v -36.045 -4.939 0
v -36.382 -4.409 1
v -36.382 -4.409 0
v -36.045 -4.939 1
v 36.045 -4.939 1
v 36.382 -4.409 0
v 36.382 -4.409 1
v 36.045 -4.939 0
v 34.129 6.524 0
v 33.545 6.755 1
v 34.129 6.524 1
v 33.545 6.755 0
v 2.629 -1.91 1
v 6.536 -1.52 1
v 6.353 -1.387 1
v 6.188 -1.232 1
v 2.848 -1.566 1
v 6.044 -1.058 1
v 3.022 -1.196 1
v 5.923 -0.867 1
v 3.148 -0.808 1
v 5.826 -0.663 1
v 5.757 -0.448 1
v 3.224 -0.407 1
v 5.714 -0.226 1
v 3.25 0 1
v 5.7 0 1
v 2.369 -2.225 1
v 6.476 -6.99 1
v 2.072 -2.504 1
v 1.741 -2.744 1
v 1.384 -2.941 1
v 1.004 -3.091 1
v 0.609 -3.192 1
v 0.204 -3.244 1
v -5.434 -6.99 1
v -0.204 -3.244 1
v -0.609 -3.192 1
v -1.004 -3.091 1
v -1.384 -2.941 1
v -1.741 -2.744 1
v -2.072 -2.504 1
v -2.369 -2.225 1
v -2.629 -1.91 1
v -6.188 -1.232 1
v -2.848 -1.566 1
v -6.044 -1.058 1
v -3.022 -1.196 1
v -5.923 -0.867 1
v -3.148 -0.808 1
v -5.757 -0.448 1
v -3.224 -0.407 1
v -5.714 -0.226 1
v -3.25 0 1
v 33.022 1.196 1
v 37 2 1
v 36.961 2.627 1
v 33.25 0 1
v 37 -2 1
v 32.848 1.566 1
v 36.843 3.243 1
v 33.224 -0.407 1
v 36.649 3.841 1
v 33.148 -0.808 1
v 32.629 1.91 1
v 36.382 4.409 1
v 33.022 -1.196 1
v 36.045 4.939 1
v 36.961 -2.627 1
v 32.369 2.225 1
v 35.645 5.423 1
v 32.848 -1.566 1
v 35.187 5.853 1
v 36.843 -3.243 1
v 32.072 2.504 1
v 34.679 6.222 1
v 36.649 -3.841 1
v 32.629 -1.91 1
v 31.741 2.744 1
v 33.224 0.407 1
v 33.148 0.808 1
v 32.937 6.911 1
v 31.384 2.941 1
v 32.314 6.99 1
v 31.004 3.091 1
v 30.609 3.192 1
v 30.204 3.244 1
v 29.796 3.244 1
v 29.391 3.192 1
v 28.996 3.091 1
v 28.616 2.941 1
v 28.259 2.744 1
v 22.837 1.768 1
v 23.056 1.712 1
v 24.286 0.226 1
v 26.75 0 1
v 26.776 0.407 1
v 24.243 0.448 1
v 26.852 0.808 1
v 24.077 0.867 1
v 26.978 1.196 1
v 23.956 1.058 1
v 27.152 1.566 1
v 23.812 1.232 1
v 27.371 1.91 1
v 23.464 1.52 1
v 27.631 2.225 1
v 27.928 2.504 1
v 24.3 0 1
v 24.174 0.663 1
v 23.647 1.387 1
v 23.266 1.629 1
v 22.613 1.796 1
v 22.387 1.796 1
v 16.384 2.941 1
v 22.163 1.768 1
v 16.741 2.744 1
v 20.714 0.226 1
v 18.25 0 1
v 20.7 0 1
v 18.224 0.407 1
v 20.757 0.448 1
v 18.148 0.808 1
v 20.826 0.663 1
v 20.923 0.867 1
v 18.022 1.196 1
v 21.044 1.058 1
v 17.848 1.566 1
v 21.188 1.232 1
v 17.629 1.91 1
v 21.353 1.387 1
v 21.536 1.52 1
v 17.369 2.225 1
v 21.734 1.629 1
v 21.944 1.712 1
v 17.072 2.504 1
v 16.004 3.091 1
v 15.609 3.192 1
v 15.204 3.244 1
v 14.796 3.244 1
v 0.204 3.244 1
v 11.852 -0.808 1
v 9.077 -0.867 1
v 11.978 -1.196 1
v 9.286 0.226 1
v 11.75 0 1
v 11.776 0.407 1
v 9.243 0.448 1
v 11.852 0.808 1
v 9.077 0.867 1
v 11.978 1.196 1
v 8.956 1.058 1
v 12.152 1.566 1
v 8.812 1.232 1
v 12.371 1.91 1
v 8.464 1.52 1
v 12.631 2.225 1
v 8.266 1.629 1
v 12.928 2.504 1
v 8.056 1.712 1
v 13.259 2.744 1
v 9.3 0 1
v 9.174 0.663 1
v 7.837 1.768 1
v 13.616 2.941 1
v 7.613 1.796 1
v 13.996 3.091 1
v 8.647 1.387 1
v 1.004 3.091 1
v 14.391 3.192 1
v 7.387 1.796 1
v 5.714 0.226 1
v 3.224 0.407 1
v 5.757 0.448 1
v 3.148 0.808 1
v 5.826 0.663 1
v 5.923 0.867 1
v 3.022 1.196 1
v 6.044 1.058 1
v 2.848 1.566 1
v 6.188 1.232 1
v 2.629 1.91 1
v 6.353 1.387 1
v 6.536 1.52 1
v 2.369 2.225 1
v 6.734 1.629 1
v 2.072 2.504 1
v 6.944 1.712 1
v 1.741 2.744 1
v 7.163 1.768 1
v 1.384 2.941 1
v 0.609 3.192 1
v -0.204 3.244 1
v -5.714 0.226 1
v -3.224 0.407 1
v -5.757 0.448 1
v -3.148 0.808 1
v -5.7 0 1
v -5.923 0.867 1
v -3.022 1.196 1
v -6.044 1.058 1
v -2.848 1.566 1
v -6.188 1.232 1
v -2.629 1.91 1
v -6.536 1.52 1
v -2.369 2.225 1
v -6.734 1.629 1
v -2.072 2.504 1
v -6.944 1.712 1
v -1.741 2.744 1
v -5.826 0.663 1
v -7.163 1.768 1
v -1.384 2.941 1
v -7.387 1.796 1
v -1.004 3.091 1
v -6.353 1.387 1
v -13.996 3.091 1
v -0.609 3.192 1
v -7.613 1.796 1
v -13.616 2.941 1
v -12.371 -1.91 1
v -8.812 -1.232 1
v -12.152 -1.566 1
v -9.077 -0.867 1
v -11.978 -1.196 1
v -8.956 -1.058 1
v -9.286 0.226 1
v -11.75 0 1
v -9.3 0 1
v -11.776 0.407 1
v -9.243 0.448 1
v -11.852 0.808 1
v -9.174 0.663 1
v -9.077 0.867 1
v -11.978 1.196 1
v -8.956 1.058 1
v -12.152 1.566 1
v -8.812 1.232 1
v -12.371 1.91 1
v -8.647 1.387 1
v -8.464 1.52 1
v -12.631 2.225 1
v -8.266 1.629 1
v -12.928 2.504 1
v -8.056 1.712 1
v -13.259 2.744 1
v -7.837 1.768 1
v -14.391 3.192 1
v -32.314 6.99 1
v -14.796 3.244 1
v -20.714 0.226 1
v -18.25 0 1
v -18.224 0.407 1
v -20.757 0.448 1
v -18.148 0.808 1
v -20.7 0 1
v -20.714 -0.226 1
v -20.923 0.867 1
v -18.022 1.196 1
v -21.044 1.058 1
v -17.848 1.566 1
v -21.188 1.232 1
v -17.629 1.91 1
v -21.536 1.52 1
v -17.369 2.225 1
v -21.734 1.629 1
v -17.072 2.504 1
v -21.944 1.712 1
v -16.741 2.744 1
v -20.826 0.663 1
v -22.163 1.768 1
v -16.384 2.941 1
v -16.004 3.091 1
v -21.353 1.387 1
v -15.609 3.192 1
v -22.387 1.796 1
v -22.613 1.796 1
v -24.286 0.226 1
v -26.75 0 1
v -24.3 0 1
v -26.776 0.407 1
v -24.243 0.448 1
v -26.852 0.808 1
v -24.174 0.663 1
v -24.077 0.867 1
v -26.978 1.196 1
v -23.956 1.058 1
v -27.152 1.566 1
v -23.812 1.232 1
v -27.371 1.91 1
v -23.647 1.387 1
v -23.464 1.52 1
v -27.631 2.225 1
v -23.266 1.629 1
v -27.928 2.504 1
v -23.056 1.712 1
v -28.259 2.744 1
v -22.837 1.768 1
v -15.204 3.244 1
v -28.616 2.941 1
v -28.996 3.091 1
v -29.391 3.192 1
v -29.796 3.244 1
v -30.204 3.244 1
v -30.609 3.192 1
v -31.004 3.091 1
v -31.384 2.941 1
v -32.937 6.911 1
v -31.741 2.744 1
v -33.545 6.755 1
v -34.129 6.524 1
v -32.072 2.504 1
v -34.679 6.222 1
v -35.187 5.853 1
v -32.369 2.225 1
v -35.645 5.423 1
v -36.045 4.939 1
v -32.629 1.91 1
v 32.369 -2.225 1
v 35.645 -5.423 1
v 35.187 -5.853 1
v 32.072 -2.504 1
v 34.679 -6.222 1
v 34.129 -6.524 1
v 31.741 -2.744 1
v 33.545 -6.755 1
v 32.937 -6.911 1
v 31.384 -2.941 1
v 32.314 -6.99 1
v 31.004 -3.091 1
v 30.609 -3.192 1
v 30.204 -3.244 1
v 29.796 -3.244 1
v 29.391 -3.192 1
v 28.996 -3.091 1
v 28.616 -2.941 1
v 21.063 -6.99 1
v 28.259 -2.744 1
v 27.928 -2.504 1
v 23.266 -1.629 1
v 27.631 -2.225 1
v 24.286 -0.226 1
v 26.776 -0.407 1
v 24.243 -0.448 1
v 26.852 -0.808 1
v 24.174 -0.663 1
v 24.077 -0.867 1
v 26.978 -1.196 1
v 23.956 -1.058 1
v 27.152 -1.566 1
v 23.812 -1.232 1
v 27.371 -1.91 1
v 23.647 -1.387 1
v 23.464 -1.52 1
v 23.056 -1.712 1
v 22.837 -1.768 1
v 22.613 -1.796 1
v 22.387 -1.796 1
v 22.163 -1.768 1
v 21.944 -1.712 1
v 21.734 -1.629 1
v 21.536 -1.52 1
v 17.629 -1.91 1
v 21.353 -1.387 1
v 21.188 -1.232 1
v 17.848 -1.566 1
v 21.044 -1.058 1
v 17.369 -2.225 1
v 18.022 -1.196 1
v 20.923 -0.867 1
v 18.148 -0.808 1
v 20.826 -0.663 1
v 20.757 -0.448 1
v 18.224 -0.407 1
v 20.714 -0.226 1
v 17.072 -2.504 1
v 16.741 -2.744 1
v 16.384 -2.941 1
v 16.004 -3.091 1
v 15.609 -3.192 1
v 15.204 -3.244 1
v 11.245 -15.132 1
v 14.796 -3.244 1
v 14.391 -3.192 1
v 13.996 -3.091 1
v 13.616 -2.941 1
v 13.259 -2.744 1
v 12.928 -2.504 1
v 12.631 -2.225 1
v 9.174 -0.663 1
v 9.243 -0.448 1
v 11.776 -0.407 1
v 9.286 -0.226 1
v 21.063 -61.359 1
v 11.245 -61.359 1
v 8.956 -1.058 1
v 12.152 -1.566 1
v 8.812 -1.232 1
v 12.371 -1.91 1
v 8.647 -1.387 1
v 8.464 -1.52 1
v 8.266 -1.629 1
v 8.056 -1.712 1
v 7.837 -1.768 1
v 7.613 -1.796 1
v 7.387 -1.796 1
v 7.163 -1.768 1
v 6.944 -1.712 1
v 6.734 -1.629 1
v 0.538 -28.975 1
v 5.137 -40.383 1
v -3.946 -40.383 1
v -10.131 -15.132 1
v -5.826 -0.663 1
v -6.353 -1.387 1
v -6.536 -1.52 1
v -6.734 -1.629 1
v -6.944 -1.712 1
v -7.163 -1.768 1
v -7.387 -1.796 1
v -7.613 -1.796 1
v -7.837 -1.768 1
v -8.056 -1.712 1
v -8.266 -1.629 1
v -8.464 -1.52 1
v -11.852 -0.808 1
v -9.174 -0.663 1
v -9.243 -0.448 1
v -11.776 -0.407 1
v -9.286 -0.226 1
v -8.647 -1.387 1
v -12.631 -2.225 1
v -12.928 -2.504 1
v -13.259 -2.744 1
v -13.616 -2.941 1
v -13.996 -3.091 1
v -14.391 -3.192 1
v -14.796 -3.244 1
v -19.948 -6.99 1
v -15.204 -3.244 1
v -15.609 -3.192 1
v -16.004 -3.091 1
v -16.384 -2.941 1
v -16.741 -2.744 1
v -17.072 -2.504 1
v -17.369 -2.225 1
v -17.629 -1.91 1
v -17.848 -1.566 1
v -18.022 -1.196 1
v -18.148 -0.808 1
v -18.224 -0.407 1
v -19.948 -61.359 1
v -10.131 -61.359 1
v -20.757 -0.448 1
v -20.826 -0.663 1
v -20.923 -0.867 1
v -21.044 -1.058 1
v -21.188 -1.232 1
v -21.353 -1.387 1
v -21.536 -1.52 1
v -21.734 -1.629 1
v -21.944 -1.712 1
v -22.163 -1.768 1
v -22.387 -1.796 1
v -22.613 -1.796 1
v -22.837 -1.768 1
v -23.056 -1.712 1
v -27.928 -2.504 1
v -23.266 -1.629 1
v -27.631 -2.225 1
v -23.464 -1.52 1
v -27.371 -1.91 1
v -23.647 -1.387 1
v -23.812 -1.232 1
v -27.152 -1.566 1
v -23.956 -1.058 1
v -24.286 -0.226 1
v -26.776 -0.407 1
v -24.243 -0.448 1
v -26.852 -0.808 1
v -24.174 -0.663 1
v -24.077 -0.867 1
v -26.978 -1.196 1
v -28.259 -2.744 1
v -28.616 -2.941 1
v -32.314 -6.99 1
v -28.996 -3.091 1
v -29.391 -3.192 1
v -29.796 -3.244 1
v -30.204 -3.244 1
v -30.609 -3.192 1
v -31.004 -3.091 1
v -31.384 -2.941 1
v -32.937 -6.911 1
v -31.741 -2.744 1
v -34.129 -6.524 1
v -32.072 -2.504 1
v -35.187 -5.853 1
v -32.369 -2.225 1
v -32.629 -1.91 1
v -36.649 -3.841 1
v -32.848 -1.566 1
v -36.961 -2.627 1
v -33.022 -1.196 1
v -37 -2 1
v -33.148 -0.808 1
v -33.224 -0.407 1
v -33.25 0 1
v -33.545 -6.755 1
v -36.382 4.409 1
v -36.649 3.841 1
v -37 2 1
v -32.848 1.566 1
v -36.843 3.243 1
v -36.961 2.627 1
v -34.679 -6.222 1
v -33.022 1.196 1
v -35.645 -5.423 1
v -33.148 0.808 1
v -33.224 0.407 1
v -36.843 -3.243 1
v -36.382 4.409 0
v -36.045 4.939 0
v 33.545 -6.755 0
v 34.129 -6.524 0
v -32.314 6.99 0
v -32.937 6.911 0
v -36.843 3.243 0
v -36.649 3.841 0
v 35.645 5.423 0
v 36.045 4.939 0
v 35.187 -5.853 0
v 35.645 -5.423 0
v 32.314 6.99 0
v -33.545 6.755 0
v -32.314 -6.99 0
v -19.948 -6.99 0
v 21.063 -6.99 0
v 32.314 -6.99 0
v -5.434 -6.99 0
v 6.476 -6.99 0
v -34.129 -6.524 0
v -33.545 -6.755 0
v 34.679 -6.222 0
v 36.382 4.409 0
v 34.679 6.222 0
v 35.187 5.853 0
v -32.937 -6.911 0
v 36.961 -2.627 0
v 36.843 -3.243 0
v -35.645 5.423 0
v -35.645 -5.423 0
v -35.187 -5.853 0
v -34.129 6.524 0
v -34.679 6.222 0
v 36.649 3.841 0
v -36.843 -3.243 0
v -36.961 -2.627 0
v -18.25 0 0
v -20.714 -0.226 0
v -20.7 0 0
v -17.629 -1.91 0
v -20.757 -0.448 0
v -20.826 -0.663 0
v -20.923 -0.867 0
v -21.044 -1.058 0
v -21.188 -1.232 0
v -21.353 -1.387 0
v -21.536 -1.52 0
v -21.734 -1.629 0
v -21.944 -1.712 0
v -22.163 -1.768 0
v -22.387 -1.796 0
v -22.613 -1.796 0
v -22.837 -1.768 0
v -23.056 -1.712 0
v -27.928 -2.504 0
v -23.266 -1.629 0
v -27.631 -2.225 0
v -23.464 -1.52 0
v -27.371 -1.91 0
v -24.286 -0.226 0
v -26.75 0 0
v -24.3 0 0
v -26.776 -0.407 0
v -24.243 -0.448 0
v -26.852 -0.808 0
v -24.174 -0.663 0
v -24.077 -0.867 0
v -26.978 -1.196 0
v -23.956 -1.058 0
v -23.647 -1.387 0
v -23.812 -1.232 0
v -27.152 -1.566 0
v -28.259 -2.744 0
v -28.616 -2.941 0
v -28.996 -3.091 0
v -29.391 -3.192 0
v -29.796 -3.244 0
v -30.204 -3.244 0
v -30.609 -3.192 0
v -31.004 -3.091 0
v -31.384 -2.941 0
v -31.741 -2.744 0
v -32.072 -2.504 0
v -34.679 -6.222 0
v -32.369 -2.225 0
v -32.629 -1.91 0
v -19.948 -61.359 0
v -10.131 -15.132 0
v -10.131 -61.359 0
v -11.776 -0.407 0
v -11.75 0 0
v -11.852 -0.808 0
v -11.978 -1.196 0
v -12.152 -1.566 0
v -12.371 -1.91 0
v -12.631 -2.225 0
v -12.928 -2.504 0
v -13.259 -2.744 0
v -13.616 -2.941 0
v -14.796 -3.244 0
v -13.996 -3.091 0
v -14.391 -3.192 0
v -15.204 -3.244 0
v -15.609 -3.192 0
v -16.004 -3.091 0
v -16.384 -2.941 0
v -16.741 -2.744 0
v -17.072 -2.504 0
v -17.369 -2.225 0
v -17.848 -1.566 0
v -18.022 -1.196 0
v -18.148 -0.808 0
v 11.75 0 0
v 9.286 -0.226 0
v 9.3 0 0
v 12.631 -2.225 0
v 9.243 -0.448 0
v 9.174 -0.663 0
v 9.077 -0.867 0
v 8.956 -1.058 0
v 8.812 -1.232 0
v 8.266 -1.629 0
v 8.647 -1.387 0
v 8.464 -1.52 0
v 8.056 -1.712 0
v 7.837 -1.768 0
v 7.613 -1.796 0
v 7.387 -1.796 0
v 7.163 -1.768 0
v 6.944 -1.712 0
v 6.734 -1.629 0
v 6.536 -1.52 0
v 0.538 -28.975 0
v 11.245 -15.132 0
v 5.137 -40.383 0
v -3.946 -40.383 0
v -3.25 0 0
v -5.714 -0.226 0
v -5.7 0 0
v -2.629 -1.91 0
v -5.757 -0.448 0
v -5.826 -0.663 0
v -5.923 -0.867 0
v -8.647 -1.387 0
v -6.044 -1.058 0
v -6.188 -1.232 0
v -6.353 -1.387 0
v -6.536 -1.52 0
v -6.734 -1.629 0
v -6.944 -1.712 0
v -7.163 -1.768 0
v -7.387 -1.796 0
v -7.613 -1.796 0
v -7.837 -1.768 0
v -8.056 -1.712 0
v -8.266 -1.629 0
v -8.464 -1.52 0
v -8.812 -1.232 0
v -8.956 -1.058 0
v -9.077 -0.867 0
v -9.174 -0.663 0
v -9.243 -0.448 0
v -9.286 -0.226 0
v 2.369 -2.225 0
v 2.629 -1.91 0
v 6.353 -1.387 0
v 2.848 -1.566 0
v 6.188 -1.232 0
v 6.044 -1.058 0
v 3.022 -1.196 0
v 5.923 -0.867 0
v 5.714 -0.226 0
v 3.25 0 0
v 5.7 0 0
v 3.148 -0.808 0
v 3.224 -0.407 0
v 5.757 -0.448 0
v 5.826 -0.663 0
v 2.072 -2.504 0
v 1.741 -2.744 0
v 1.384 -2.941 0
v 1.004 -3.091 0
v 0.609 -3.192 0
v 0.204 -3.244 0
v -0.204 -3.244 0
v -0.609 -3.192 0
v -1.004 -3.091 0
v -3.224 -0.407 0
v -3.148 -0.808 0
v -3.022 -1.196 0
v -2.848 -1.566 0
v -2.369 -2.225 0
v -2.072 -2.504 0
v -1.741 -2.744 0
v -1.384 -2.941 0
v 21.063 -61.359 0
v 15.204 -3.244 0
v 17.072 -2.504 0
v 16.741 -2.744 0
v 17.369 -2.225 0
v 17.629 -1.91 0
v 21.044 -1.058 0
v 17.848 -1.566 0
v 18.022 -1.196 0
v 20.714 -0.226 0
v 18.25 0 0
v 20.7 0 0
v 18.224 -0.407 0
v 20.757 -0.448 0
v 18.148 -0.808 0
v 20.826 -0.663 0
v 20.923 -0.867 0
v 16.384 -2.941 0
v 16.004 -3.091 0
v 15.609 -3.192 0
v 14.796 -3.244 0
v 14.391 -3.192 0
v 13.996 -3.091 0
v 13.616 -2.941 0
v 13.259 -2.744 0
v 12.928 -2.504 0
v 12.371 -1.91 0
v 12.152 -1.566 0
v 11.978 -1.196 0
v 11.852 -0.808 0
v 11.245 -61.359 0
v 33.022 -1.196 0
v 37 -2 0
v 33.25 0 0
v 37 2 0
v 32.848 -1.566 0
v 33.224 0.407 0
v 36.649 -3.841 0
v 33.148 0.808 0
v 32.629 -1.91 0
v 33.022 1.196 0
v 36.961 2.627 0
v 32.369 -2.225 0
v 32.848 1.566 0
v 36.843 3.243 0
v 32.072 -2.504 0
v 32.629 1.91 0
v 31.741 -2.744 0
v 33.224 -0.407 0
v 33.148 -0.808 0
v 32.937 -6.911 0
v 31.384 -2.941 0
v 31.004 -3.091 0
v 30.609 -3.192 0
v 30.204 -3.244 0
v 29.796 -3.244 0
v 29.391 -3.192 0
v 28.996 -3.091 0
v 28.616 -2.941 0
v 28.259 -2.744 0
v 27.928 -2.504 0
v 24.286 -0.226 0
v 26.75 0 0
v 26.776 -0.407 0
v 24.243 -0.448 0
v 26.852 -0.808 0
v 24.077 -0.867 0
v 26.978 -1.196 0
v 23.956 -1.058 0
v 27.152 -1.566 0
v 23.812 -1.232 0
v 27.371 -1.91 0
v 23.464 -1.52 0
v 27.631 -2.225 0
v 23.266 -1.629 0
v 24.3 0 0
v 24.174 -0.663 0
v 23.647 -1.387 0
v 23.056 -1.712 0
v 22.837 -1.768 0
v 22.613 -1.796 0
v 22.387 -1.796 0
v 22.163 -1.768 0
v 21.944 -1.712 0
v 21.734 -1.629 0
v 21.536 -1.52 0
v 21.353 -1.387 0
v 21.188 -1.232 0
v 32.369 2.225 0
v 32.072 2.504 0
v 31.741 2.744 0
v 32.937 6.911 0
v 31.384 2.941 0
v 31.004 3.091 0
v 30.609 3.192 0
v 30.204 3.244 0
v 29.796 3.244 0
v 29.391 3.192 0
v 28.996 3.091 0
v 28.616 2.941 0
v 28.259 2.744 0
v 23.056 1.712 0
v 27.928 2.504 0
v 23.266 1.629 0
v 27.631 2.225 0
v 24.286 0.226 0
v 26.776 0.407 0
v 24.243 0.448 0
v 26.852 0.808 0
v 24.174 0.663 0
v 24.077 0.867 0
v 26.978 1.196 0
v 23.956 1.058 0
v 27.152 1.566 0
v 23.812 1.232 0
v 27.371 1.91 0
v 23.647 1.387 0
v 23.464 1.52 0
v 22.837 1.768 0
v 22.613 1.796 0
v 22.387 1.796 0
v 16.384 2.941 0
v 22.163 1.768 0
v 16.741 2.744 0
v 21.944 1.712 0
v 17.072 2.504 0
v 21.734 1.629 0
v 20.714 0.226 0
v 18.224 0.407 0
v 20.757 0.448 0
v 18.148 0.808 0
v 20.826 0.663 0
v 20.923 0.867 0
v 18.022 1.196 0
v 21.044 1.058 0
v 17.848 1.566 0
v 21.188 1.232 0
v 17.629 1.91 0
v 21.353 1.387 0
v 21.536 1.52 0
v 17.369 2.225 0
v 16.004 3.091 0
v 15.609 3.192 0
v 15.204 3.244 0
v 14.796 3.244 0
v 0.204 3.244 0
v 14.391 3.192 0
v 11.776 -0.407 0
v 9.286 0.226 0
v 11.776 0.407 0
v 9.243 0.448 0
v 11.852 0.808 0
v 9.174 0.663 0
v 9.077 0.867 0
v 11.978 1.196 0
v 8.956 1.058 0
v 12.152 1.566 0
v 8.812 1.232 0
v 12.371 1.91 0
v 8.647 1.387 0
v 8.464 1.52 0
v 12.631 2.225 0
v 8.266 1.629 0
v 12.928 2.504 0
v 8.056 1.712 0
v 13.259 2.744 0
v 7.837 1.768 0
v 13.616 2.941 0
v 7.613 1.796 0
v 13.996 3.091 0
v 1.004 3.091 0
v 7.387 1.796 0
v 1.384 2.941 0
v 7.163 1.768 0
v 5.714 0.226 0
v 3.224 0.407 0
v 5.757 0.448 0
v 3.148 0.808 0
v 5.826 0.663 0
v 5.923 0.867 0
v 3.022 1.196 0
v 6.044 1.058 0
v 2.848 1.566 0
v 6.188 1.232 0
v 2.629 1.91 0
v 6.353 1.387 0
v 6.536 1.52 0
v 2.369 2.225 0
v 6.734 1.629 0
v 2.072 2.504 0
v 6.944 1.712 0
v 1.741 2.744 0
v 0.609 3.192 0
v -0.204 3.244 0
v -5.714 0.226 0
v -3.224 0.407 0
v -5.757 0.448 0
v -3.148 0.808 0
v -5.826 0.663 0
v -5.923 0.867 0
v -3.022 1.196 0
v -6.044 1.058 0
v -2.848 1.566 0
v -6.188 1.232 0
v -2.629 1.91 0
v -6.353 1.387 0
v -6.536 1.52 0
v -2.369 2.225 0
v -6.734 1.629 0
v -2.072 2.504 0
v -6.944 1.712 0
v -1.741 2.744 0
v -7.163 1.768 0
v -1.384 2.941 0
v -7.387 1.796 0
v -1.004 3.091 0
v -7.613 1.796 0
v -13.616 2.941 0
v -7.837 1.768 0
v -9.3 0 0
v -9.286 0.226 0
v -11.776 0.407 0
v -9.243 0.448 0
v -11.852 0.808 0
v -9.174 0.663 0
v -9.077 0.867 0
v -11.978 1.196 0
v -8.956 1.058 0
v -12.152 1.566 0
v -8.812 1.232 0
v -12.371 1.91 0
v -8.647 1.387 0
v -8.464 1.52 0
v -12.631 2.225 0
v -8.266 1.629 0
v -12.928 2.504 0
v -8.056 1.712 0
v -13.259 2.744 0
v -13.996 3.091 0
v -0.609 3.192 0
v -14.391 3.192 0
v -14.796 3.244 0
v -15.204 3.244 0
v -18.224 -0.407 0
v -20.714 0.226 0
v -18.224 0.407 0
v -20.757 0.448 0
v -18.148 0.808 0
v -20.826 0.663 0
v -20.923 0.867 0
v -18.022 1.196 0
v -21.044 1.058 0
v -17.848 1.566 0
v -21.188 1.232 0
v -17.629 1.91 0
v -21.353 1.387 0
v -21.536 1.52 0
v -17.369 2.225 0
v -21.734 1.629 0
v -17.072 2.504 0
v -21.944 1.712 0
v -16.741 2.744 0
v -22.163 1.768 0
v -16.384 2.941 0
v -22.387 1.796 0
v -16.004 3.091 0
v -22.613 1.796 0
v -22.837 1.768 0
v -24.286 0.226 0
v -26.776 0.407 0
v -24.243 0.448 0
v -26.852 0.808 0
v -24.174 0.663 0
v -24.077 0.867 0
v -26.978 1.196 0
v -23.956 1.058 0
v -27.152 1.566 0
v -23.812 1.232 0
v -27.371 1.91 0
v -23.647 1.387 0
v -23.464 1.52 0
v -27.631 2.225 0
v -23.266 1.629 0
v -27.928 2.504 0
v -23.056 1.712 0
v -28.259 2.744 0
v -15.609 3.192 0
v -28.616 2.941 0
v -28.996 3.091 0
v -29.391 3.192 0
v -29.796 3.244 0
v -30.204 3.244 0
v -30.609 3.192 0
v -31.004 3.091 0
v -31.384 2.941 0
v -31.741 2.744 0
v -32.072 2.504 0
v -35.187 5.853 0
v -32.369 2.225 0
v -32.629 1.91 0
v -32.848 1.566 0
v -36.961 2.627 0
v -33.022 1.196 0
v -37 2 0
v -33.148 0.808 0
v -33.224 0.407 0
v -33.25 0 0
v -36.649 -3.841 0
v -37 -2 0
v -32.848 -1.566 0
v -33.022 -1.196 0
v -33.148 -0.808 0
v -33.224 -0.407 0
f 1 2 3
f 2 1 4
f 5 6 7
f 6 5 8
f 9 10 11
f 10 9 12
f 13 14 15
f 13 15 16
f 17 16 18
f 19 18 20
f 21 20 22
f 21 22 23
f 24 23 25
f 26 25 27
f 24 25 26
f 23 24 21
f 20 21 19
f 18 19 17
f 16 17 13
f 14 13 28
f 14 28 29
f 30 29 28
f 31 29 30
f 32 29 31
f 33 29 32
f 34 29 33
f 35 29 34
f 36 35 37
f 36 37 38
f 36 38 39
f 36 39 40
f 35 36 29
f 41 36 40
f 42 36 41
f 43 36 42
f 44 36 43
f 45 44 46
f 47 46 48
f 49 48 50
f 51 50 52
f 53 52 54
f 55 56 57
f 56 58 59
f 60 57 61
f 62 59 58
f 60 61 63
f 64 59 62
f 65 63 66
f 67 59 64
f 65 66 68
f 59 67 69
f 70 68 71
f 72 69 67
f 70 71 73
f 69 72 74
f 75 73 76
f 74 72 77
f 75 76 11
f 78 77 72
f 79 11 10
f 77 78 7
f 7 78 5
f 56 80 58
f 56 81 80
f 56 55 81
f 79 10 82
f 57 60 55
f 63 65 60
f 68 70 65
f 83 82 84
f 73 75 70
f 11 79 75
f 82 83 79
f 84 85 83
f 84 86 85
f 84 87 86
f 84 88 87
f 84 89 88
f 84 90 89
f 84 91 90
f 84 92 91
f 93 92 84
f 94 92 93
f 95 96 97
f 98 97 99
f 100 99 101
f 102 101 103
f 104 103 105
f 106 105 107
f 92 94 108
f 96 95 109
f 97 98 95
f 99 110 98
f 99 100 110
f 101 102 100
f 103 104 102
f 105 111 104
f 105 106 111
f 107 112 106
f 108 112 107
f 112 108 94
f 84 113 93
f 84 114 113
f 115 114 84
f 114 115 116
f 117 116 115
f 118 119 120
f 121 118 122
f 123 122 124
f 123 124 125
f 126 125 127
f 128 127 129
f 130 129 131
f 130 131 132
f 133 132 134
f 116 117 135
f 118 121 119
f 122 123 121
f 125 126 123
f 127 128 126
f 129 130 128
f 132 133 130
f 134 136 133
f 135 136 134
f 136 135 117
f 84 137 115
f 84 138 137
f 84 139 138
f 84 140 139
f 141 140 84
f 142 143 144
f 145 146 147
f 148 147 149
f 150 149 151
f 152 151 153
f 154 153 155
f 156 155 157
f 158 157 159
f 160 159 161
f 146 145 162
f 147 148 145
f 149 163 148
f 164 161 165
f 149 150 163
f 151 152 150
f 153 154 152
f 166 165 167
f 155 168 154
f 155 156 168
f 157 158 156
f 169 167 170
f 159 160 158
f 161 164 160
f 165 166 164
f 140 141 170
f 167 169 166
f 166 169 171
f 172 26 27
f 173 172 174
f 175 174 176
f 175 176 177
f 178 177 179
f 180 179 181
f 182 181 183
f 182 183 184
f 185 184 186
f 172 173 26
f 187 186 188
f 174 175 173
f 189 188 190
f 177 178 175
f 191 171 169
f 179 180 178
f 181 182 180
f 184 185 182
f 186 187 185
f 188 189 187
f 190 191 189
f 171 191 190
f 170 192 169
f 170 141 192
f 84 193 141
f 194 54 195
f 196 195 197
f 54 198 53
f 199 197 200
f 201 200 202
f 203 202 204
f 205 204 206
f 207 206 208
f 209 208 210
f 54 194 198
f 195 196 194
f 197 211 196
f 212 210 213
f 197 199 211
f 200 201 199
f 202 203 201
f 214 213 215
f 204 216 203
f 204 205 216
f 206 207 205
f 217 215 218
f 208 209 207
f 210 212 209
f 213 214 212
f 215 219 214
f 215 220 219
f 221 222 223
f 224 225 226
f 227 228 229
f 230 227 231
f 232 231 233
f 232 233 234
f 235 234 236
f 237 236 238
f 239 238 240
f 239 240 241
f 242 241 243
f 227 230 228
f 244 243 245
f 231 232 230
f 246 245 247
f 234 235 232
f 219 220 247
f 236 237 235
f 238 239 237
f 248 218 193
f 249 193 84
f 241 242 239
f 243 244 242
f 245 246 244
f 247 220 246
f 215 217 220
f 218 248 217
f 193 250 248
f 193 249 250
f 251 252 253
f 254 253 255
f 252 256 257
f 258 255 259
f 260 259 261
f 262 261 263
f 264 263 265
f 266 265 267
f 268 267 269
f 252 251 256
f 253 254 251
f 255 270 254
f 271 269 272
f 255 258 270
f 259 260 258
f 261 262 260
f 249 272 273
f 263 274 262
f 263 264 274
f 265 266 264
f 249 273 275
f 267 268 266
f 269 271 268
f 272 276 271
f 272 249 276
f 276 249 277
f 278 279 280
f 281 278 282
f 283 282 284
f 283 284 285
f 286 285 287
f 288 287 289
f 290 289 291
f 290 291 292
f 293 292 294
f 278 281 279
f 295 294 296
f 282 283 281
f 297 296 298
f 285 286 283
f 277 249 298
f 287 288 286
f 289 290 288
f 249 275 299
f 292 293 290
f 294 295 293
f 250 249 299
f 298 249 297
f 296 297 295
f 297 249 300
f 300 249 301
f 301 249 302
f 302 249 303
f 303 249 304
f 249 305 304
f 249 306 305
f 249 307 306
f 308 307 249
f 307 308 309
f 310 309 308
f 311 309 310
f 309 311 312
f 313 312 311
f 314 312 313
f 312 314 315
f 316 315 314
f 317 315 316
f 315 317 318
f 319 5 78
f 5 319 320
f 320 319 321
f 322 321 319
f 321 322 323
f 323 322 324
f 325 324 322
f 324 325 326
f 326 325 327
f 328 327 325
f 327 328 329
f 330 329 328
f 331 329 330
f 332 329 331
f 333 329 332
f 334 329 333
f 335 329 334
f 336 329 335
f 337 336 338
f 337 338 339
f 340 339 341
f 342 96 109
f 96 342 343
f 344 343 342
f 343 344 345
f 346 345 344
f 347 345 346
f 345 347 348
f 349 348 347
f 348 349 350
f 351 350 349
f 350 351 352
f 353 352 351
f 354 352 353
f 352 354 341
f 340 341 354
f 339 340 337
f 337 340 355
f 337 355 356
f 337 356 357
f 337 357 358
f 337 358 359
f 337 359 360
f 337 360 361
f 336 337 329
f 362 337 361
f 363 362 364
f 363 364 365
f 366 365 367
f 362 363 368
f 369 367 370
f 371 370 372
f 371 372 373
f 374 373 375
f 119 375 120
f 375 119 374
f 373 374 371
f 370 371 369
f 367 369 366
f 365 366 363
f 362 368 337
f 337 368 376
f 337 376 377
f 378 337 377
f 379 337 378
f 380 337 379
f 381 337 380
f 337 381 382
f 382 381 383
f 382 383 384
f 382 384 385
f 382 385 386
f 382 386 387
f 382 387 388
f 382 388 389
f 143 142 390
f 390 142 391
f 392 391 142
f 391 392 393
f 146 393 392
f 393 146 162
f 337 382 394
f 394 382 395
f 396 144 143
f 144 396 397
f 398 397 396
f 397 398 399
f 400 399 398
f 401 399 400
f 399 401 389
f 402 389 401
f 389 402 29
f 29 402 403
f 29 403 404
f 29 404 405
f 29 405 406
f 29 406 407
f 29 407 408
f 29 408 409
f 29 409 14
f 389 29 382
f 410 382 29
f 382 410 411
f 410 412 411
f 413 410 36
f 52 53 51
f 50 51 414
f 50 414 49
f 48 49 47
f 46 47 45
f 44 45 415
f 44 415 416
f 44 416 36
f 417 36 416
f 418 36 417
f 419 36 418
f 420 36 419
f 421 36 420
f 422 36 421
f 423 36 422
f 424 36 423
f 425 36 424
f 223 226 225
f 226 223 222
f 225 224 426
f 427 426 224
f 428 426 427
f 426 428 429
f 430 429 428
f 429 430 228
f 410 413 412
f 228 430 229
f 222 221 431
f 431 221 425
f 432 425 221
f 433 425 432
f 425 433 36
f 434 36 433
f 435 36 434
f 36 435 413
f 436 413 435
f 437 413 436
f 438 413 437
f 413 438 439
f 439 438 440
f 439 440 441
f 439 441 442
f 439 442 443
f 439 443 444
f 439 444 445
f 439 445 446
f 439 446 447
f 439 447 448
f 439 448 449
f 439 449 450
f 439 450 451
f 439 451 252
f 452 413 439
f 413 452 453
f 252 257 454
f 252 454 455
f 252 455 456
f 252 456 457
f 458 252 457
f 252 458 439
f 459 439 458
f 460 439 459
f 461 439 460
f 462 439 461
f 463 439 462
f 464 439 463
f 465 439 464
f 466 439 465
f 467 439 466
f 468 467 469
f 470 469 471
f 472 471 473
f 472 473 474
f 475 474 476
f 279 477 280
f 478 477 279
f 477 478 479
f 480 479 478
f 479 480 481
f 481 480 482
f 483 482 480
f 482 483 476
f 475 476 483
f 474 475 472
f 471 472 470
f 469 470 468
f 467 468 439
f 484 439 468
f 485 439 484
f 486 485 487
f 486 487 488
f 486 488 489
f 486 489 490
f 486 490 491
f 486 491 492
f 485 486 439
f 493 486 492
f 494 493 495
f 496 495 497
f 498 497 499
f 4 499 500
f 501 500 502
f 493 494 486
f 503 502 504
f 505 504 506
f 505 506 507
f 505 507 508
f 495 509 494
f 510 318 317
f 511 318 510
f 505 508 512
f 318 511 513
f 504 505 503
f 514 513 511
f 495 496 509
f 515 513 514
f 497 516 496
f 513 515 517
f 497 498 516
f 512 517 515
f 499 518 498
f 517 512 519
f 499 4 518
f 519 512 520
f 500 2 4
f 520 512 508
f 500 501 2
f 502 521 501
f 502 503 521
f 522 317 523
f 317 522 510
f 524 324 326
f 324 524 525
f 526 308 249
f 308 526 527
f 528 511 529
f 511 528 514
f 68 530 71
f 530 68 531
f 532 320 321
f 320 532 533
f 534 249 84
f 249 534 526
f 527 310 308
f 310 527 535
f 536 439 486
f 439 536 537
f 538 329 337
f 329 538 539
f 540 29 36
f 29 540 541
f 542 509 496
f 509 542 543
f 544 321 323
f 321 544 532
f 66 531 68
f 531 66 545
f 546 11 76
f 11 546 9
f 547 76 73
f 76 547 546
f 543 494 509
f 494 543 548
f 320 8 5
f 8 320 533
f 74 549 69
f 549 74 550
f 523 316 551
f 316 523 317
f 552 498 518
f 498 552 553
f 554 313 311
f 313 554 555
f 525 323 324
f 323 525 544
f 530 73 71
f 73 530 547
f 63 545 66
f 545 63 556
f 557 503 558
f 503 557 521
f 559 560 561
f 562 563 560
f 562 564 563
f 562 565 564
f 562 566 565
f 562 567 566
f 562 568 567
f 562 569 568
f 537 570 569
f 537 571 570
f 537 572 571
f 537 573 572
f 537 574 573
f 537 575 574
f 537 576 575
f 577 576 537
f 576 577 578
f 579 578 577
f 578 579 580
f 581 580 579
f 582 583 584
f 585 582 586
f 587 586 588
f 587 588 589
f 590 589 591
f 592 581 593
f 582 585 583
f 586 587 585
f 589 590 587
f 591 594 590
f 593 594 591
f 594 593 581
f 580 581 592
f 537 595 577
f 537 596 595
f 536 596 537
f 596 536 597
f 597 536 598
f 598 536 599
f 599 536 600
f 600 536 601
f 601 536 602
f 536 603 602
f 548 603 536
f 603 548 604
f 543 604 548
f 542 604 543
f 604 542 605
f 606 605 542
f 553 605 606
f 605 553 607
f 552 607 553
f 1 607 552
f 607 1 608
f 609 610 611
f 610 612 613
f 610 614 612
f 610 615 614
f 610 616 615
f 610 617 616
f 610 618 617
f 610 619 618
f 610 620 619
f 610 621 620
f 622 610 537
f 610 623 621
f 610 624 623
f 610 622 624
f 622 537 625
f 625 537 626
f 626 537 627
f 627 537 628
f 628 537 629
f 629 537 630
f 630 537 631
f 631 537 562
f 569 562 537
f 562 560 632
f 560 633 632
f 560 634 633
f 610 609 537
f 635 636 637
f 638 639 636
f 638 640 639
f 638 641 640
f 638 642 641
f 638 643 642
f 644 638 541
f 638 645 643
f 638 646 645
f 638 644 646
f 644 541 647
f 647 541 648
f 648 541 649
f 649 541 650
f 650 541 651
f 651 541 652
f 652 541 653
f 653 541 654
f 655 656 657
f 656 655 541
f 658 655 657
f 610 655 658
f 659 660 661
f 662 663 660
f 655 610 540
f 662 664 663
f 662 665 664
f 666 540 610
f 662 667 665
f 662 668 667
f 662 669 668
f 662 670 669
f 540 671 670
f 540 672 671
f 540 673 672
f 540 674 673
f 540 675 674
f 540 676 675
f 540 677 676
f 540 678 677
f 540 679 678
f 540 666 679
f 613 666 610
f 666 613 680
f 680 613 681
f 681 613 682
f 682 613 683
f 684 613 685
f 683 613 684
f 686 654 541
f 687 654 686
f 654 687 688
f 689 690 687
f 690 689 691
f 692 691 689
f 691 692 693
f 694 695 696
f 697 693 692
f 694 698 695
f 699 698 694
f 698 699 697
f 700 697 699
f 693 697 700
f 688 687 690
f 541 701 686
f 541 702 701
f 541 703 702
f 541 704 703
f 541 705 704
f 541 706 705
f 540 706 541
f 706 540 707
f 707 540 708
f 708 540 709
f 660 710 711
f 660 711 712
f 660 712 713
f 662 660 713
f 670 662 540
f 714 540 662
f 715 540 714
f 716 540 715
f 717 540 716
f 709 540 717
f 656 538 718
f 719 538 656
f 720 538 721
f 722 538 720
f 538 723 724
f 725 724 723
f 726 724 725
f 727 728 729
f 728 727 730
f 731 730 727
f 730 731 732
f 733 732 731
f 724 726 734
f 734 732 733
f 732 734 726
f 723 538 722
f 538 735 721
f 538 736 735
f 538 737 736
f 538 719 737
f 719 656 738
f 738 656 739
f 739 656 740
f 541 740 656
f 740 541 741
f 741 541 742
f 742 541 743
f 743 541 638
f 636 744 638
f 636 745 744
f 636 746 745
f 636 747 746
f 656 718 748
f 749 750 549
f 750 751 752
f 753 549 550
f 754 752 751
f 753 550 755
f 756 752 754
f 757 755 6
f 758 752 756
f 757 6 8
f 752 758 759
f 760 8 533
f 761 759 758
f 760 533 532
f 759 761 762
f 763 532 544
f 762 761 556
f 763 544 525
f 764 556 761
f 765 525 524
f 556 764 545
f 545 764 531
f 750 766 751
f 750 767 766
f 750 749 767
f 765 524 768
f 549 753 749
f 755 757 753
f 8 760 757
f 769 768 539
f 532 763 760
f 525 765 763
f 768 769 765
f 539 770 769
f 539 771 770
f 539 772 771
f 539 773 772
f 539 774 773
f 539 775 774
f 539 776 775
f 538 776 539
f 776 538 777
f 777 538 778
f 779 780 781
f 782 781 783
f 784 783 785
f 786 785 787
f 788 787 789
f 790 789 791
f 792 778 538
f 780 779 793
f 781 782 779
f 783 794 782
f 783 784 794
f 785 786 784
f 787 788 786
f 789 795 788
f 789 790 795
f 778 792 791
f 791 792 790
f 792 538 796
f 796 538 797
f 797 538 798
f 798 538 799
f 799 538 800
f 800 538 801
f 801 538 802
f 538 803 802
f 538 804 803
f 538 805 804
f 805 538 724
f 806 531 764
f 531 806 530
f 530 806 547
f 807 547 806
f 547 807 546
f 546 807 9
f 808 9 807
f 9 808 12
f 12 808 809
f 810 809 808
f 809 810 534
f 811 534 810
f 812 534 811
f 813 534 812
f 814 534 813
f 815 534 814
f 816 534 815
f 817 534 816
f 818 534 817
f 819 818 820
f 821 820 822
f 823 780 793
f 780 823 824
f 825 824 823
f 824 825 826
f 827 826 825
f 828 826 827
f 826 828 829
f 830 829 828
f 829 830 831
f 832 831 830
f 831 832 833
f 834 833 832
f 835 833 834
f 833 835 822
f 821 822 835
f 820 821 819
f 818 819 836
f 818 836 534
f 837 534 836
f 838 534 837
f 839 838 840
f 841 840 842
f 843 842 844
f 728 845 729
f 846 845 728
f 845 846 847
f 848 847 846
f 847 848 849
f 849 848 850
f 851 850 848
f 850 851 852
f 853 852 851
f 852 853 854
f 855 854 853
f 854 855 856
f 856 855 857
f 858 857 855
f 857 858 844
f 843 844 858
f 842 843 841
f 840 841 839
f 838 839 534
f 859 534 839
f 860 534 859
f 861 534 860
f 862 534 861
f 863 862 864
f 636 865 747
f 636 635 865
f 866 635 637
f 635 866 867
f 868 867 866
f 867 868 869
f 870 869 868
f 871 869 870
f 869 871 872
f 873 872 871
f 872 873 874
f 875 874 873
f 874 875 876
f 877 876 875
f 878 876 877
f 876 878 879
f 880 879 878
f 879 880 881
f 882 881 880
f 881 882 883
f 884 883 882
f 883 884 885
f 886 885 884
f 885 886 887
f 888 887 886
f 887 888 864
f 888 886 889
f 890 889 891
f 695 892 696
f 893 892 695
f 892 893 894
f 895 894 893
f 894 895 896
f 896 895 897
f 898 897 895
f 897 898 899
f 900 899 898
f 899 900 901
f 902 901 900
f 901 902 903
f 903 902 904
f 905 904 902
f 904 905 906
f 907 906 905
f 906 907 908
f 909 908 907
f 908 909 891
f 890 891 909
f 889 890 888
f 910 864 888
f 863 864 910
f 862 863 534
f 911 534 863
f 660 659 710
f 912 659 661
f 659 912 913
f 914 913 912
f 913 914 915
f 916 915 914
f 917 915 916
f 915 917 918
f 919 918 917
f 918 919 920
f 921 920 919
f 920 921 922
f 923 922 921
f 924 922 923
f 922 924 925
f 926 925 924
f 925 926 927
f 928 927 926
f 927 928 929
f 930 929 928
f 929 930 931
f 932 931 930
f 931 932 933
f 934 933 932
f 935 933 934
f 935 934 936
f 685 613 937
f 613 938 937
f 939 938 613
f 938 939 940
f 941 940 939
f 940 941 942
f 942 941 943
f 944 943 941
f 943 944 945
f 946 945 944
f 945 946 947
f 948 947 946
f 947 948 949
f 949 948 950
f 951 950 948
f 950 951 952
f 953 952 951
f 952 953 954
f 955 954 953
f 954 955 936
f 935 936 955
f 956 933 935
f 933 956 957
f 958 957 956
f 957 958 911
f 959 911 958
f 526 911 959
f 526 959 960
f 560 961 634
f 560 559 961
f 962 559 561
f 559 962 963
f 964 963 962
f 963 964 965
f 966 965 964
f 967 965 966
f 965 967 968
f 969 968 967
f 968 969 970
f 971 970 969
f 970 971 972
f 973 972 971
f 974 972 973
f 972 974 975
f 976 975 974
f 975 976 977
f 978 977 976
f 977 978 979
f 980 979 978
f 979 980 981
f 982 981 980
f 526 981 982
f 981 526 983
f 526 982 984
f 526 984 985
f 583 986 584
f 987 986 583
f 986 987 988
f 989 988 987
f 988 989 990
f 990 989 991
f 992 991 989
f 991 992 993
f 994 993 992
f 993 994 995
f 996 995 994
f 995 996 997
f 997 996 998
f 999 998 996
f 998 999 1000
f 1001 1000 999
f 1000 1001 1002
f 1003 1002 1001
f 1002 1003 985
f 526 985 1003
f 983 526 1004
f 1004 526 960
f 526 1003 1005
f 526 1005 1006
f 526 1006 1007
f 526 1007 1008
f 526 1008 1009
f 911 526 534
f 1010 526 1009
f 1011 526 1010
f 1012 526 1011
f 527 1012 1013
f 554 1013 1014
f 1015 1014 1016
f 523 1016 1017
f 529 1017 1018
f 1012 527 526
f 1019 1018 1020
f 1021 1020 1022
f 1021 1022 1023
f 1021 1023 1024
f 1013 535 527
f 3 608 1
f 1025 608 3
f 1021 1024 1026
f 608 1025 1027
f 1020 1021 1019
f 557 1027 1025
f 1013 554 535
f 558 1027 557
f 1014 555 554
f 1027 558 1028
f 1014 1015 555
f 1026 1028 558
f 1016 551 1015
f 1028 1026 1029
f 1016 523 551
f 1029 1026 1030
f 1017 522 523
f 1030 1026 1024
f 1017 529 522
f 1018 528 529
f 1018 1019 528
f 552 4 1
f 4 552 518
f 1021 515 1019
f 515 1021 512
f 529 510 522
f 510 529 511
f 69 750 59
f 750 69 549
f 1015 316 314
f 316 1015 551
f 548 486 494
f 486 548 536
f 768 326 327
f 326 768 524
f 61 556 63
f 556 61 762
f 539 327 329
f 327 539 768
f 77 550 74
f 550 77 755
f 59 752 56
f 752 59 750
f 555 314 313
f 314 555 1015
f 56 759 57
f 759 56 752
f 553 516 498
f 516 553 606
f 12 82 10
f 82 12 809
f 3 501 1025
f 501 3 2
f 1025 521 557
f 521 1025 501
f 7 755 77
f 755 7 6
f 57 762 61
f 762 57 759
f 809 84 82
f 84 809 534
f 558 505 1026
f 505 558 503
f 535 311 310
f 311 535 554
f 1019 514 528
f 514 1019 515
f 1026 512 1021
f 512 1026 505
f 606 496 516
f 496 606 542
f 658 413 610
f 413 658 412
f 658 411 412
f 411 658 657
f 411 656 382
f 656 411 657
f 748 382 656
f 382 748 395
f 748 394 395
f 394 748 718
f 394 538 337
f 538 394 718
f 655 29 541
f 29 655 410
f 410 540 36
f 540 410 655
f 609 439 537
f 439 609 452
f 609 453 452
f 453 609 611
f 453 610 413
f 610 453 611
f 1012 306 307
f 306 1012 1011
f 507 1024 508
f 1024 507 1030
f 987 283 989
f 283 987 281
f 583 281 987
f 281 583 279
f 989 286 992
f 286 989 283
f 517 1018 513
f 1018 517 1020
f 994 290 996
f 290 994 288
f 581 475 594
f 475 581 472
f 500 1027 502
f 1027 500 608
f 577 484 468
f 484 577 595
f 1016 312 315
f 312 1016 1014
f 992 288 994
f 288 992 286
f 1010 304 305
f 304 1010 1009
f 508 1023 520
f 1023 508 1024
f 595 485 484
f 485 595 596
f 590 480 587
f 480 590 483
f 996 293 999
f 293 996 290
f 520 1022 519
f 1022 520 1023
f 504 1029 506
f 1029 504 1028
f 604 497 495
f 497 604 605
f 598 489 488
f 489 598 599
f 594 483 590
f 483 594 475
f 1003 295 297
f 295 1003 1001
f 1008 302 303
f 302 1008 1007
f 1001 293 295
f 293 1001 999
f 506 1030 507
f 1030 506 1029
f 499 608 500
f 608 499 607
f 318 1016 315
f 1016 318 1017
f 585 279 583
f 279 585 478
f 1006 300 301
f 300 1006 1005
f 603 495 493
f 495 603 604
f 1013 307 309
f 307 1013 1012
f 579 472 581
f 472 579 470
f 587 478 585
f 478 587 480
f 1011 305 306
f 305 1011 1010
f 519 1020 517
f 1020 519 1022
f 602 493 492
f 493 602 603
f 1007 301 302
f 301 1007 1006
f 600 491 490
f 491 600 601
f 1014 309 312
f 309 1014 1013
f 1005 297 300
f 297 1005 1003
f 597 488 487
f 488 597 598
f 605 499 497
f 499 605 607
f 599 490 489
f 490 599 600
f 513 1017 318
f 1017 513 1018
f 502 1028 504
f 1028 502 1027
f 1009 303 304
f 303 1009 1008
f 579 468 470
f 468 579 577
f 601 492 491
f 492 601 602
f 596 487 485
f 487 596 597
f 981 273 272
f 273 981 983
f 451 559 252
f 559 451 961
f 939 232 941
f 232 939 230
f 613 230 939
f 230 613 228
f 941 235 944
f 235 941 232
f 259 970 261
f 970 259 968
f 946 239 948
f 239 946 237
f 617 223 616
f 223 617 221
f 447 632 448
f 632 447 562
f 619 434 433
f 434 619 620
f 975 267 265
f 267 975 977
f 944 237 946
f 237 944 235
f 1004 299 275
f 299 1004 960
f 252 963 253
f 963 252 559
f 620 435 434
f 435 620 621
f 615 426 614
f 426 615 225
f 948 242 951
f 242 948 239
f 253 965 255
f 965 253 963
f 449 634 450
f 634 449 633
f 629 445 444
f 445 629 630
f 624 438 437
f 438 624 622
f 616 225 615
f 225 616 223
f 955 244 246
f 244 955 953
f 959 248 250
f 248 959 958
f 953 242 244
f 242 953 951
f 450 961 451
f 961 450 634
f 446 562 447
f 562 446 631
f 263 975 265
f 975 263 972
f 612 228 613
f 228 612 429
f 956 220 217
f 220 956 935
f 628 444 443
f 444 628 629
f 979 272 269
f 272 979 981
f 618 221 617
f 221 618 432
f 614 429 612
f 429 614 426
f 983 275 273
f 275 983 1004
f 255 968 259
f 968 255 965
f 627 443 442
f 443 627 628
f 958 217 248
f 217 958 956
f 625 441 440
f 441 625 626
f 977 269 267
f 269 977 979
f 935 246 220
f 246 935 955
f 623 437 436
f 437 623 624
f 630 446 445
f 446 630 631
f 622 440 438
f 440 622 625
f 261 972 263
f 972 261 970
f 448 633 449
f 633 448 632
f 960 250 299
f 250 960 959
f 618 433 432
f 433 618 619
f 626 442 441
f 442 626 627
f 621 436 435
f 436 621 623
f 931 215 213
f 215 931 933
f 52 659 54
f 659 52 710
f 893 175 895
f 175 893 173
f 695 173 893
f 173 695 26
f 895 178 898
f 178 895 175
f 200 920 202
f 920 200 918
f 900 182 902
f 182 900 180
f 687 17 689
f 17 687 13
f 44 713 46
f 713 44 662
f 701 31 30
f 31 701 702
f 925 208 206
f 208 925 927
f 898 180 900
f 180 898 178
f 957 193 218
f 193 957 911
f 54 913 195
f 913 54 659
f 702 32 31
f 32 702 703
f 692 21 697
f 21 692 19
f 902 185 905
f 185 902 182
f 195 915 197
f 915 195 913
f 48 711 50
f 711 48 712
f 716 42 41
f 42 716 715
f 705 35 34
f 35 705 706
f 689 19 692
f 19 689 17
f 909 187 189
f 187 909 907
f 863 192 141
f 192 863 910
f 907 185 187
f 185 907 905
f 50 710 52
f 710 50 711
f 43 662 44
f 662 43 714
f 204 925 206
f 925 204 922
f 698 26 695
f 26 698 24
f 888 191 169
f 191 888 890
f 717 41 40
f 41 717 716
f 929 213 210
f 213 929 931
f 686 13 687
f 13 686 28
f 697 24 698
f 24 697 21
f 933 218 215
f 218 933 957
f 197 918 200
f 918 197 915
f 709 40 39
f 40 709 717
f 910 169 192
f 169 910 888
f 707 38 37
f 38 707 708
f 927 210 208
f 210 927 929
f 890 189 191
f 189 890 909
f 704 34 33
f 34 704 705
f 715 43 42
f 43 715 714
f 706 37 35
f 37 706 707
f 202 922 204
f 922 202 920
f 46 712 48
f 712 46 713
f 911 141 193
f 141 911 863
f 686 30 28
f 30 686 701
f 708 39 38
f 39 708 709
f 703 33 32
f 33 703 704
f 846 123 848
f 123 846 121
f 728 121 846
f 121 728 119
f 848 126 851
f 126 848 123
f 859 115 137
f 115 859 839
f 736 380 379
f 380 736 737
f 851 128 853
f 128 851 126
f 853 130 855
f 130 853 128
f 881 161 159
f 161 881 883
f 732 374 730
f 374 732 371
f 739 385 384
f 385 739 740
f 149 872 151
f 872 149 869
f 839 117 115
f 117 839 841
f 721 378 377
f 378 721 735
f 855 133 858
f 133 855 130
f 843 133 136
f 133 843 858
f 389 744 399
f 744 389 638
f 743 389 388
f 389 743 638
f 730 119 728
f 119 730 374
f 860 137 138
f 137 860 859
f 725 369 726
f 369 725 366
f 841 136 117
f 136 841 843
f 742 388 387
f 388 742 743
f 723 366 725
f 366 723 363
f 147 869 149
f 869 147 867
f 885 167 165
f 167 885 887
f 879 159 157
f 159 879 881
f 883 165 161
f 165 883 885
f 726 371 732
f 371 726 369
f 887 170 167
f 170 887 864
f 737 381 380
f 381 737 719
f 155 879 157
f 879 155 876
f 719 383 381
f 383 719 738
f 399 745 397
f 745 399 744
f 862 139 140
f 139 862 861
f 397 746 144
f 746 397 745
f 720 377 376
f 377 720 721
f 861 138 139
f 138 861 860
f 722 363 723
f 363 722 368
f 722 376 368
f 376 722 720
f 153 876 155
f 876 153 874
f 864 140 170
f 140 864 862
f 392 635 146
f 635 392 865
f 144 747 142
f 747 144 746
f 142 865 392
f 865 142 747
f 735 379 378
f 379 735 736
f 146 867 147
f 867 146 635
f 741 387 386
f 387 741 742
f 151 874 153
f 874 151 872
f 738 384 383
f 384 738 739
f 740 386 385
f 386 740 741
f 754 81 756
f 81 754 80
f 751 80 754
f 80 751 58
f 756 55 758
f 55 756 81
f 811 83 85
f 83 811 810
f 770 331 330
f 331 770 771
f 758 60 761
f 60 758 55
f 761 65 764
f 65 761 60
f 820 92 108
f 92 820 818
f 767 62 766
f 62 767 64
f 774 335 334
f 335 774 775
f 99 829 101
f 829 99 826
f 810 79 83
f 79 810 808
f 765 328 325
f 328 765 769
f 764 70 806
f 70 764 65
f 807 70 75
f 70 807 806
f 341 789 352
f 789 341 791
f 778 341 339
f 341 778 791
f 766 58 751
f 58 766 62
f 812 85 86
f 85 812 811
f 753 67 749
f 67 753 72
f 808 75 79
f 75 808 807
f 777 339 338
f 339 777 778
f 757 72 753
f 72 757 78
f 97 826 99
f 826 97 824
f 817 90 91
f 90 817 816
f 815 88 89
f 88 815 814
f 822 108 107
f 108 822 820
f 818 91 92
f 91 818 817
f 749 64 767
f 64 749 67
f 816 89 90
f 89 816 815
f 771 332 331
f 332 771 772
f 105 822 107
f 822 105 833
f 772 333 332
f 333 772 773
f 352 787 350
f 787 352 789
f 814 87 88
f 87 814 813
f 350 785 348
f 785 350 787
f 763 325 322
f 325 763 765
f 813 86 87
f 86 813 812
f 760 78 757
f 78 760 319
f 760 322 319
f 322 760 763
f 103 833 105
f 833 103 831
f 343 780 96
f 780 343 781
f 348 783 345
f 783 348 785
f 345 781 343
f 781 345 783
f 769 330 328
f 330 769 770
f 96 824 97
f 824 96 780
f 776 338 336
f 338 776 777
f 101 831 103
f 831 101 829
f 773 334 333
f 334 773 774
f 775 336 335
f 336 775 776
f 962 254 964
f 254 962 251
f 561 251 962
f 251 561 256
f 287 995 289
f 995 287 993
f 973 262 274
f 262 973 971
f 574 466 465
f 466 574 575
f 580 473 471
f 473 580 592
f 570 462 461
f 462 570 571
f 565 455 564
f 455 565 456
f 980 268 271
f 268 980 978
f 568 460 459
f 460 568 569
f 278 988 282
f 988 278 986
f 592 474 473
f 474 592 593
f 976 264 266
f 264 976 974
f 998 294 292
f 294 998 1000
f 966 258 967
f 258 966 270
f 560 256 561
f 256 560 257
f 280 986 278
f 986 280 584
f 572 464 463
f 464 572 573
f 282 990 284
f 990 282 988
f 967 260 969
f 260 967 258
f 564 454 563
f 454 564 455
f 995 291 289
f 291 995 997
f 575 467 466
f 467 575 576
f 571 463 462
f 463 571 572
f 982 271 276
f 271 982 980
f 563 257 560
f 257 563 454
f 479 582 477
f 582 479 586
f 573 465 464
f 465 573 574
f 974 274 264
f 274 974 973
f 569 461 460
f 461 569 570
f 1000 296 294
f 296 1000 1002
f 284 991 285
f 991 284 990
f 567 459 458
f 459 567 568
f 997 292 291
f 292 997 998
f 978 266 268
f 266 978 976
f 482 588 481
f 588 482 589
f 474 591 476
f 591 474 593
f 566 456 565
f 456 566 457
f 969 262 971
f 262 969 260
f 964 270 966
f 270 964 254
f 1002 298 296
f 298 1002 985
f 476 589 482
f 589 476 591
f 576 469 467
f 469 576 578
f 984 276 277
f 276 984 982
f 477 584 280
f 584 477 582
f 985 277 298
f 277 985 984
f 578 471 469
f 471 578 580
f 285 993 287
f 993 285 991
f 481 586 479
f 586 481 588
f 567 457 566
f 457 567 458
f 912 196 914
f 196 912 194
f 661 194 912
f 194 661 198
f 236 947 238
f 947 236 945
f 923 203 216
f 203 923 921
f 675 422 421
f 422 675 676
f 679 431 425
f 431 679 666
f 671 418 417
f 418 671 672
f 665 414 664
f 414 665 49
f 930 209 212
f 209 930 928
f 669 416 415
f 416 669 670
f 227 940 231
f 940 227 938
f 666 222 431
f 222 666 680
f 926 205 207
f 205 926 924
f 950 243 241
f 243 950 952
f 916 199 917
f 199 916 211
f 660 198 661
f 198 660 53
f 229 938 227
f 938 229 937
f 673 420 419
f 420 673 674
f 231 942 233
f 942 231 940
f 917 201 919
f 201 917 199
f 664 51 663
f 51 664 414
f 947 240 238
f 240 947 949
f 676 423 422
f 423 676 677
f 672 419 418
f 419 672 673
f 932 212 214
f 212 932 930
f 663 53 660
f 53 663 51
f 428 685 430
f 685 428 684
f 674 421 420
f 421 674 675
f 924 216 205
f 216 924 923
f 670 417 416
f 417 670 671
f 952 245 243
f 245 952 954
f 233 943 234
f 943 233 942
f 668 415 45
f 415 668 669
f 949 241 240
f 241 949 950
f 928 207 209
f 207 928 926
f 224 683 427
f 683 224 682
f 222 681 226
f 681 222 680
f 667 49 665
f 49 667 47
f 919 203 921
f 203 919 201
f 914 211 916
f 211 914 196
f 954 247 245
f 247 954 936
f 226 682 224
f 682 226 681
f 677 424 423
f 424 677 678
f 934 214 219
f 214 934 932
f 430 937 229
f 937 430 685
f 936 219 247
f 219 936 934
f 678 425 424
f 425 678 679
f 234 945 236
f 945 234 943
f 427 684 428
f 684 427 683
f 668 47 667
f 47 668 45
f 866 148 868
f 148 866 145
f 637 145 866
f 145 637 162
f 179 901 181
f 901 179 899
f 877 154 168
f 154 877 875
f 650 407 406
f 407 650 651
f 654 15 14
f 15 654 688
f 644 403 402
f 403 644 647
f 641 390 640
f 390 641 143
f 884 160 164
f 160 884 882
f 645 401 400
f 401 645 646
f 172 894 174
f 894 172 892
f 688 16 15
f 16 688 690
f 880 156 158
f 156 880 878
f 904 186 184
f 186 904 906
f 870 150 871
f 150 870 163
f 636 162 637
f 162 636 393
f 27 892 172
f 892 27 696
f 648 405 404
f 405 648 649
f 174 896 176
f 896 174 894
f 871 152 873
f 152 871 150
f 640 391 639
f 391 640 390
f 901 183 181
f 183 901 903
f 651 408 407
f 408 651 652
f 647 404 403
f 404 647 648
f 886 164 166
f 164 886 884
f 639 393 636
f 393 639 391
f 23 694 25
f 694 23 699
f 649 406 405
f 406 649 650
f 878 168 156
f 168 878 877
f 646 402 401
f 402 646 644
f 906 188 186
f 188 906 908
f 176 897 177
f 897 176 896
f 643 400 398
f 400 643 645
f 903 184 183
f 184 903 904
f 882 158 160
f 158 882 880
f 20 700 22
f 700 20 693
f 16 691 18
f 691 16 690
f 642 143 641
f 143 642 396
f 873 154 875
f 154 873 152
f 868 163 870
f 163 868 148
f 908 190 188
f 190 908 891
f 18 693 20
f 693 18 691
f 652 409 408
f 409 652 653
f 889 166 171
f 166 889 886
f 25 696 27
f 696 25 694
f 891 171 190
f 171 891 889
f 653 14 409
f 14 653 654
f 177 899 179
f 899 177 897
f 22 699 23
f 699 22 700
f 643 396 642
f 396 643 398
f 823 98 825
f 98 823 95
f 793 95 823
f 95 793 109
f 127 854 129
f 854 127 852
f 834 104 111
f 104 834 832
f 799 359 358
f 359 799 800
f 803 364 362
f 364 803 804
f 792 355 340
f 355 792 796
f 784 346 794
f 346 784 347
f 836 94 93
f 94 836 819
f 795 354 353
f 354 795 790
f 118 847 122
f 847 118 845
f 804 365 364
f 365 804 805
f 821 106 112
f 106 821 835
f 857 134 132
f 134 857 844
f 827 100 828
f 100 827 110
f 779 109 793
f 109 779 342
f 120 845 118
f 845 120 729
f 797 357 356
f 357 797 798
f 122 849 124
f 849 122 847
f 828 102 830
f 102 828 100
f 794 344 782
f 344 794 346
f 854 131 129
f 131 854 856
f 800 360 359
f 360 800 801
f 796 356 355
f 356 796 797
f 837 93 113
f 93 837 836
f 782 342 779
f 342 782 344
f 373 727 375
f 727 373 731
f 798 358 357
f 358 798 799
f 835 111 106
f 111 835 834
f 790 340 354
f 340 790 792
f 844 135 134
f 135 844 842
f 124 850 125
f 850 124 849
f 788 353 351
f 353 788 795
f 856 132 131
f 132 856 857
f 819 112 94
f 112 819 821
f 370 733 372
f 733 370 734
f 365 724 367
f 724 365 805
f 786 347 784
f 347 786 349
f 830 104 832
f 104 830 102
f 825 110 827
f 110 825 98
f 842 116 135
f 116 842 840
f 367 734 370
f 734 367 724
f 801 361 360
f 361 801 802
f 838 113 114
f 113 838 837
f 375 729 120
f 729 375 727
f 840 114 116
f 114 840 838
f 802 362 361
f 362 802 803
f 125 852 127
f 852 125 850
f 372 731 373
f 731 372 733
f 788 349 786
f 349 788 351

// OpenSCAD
$fn = 50;


difference() {
	union() {
		hull() {
			translate(v = [-32.0000000000, 2.0000000000, 0]) {
				cylinder(h = 1, r = 5);
			}
			translate(v = [32.0000000000, 2.0000000000, 0]) {
				cylinder(h = 1, r = 5);
			}
			translate(v = [-32.0000000000, -2.0000000000, 0]) {
				cylinder(h = 1, r = 5);
			}
			translate(v = [32.0000000000, -2.0000000000, 0]) {
				cylinder(h = 1, r = 5);
			}
		}
		translate(v = [0, -5, 0]) {
			linear_extrude(height = 1) {
				text(font = "DejaVu Sans Mono:style=Bold", halign = "center", size = 57.0000000000, text = "M", valign = "top");
			}
		}
	}
	union() {
		translate(v = [-30.0000000000, 0.0000000000, 0]) {
			translate(v = [0, 0, -100]) {
				cylinder(h = 200, r = 3.2500000000);
			}
		}
		translate(v = [-15.0000000000, 0.0000000000, 0]) {
			translate(v = [0, 0, -100]) {
				cylinder(h = 200, r = 3.2500000000);
			}
		}
		translate(v = [0, 0, -100]) {
			cylinder(h = 200, r = 3.2500000000);
		}
		translate(v = [15.0000000000, 0.0000000000, 0]) {
			translate(v = [0, 0, -100]) {
				cylinder(h = 200, r = 3.2500000000);
			}
		}
		translate(v = [30.0000000000, 0.0000000000, 0]) {
			translate(v = [0, 0, -100]) {
				cylinder(h = 200, r = 3.2500000000);
			}
		}
		translate(v = [-30.0000000000, 0.0000000000, 0]) {
			translate(v = [0, 0, -100]) {
				cylinder(h = 200, r = 1.8000000000);
			}
		}
		translate(v = [-22.5000000000, 0.0000000000, 0]) {
			translate(v = [0, 0, -100]) {
				cylinder(h = 200, r = 1.8000000000);
			}
		}
		translate(v = [-15.0000000000, 0.0000000000, 0]) {
			translate(v = [0, 0, -100]) {
				cylinder(h = 200, r = 1.8000000000);
			}
		}
		translate(v = [-7.5000000000, 0.0000000000, 0]) {
			translate(v = [0, 0, -100]) {
				cylinder(h = 200, r = 1.8000000000);
			}
		}
		translate(v = [0, 0, -100]) {
			cylinder(h = 200, r = 1.8000000000);
		}
		translate(v = [7.5000000000, 0.0000000000, 0]) {
			translate(v = [0, 0, -100]) {
				cylinder(h = 200, r = 1.8000000000);
			}
		}
		translate(v = [15.0000000000, 0.0000000000, 0]) {
			translate(v = [0, 0, -100]) {
				cylinder(h = 200, r = 1.8000000000);
			}
		}
		translate(v = [22.5000000000, 0.0000000000, 0]) {
			translate(v = [0, 0, -100]) {
				cylinder(h = 200, r = 1.8000000000);
			}
		}
		translate(v = [30.0000000000, 0.0000000000, 0]) {
			translate(v = [0, 0, -100]) {
				cylinder(h = 200, r = 1.8000000000);
			}
		}
	}
}
